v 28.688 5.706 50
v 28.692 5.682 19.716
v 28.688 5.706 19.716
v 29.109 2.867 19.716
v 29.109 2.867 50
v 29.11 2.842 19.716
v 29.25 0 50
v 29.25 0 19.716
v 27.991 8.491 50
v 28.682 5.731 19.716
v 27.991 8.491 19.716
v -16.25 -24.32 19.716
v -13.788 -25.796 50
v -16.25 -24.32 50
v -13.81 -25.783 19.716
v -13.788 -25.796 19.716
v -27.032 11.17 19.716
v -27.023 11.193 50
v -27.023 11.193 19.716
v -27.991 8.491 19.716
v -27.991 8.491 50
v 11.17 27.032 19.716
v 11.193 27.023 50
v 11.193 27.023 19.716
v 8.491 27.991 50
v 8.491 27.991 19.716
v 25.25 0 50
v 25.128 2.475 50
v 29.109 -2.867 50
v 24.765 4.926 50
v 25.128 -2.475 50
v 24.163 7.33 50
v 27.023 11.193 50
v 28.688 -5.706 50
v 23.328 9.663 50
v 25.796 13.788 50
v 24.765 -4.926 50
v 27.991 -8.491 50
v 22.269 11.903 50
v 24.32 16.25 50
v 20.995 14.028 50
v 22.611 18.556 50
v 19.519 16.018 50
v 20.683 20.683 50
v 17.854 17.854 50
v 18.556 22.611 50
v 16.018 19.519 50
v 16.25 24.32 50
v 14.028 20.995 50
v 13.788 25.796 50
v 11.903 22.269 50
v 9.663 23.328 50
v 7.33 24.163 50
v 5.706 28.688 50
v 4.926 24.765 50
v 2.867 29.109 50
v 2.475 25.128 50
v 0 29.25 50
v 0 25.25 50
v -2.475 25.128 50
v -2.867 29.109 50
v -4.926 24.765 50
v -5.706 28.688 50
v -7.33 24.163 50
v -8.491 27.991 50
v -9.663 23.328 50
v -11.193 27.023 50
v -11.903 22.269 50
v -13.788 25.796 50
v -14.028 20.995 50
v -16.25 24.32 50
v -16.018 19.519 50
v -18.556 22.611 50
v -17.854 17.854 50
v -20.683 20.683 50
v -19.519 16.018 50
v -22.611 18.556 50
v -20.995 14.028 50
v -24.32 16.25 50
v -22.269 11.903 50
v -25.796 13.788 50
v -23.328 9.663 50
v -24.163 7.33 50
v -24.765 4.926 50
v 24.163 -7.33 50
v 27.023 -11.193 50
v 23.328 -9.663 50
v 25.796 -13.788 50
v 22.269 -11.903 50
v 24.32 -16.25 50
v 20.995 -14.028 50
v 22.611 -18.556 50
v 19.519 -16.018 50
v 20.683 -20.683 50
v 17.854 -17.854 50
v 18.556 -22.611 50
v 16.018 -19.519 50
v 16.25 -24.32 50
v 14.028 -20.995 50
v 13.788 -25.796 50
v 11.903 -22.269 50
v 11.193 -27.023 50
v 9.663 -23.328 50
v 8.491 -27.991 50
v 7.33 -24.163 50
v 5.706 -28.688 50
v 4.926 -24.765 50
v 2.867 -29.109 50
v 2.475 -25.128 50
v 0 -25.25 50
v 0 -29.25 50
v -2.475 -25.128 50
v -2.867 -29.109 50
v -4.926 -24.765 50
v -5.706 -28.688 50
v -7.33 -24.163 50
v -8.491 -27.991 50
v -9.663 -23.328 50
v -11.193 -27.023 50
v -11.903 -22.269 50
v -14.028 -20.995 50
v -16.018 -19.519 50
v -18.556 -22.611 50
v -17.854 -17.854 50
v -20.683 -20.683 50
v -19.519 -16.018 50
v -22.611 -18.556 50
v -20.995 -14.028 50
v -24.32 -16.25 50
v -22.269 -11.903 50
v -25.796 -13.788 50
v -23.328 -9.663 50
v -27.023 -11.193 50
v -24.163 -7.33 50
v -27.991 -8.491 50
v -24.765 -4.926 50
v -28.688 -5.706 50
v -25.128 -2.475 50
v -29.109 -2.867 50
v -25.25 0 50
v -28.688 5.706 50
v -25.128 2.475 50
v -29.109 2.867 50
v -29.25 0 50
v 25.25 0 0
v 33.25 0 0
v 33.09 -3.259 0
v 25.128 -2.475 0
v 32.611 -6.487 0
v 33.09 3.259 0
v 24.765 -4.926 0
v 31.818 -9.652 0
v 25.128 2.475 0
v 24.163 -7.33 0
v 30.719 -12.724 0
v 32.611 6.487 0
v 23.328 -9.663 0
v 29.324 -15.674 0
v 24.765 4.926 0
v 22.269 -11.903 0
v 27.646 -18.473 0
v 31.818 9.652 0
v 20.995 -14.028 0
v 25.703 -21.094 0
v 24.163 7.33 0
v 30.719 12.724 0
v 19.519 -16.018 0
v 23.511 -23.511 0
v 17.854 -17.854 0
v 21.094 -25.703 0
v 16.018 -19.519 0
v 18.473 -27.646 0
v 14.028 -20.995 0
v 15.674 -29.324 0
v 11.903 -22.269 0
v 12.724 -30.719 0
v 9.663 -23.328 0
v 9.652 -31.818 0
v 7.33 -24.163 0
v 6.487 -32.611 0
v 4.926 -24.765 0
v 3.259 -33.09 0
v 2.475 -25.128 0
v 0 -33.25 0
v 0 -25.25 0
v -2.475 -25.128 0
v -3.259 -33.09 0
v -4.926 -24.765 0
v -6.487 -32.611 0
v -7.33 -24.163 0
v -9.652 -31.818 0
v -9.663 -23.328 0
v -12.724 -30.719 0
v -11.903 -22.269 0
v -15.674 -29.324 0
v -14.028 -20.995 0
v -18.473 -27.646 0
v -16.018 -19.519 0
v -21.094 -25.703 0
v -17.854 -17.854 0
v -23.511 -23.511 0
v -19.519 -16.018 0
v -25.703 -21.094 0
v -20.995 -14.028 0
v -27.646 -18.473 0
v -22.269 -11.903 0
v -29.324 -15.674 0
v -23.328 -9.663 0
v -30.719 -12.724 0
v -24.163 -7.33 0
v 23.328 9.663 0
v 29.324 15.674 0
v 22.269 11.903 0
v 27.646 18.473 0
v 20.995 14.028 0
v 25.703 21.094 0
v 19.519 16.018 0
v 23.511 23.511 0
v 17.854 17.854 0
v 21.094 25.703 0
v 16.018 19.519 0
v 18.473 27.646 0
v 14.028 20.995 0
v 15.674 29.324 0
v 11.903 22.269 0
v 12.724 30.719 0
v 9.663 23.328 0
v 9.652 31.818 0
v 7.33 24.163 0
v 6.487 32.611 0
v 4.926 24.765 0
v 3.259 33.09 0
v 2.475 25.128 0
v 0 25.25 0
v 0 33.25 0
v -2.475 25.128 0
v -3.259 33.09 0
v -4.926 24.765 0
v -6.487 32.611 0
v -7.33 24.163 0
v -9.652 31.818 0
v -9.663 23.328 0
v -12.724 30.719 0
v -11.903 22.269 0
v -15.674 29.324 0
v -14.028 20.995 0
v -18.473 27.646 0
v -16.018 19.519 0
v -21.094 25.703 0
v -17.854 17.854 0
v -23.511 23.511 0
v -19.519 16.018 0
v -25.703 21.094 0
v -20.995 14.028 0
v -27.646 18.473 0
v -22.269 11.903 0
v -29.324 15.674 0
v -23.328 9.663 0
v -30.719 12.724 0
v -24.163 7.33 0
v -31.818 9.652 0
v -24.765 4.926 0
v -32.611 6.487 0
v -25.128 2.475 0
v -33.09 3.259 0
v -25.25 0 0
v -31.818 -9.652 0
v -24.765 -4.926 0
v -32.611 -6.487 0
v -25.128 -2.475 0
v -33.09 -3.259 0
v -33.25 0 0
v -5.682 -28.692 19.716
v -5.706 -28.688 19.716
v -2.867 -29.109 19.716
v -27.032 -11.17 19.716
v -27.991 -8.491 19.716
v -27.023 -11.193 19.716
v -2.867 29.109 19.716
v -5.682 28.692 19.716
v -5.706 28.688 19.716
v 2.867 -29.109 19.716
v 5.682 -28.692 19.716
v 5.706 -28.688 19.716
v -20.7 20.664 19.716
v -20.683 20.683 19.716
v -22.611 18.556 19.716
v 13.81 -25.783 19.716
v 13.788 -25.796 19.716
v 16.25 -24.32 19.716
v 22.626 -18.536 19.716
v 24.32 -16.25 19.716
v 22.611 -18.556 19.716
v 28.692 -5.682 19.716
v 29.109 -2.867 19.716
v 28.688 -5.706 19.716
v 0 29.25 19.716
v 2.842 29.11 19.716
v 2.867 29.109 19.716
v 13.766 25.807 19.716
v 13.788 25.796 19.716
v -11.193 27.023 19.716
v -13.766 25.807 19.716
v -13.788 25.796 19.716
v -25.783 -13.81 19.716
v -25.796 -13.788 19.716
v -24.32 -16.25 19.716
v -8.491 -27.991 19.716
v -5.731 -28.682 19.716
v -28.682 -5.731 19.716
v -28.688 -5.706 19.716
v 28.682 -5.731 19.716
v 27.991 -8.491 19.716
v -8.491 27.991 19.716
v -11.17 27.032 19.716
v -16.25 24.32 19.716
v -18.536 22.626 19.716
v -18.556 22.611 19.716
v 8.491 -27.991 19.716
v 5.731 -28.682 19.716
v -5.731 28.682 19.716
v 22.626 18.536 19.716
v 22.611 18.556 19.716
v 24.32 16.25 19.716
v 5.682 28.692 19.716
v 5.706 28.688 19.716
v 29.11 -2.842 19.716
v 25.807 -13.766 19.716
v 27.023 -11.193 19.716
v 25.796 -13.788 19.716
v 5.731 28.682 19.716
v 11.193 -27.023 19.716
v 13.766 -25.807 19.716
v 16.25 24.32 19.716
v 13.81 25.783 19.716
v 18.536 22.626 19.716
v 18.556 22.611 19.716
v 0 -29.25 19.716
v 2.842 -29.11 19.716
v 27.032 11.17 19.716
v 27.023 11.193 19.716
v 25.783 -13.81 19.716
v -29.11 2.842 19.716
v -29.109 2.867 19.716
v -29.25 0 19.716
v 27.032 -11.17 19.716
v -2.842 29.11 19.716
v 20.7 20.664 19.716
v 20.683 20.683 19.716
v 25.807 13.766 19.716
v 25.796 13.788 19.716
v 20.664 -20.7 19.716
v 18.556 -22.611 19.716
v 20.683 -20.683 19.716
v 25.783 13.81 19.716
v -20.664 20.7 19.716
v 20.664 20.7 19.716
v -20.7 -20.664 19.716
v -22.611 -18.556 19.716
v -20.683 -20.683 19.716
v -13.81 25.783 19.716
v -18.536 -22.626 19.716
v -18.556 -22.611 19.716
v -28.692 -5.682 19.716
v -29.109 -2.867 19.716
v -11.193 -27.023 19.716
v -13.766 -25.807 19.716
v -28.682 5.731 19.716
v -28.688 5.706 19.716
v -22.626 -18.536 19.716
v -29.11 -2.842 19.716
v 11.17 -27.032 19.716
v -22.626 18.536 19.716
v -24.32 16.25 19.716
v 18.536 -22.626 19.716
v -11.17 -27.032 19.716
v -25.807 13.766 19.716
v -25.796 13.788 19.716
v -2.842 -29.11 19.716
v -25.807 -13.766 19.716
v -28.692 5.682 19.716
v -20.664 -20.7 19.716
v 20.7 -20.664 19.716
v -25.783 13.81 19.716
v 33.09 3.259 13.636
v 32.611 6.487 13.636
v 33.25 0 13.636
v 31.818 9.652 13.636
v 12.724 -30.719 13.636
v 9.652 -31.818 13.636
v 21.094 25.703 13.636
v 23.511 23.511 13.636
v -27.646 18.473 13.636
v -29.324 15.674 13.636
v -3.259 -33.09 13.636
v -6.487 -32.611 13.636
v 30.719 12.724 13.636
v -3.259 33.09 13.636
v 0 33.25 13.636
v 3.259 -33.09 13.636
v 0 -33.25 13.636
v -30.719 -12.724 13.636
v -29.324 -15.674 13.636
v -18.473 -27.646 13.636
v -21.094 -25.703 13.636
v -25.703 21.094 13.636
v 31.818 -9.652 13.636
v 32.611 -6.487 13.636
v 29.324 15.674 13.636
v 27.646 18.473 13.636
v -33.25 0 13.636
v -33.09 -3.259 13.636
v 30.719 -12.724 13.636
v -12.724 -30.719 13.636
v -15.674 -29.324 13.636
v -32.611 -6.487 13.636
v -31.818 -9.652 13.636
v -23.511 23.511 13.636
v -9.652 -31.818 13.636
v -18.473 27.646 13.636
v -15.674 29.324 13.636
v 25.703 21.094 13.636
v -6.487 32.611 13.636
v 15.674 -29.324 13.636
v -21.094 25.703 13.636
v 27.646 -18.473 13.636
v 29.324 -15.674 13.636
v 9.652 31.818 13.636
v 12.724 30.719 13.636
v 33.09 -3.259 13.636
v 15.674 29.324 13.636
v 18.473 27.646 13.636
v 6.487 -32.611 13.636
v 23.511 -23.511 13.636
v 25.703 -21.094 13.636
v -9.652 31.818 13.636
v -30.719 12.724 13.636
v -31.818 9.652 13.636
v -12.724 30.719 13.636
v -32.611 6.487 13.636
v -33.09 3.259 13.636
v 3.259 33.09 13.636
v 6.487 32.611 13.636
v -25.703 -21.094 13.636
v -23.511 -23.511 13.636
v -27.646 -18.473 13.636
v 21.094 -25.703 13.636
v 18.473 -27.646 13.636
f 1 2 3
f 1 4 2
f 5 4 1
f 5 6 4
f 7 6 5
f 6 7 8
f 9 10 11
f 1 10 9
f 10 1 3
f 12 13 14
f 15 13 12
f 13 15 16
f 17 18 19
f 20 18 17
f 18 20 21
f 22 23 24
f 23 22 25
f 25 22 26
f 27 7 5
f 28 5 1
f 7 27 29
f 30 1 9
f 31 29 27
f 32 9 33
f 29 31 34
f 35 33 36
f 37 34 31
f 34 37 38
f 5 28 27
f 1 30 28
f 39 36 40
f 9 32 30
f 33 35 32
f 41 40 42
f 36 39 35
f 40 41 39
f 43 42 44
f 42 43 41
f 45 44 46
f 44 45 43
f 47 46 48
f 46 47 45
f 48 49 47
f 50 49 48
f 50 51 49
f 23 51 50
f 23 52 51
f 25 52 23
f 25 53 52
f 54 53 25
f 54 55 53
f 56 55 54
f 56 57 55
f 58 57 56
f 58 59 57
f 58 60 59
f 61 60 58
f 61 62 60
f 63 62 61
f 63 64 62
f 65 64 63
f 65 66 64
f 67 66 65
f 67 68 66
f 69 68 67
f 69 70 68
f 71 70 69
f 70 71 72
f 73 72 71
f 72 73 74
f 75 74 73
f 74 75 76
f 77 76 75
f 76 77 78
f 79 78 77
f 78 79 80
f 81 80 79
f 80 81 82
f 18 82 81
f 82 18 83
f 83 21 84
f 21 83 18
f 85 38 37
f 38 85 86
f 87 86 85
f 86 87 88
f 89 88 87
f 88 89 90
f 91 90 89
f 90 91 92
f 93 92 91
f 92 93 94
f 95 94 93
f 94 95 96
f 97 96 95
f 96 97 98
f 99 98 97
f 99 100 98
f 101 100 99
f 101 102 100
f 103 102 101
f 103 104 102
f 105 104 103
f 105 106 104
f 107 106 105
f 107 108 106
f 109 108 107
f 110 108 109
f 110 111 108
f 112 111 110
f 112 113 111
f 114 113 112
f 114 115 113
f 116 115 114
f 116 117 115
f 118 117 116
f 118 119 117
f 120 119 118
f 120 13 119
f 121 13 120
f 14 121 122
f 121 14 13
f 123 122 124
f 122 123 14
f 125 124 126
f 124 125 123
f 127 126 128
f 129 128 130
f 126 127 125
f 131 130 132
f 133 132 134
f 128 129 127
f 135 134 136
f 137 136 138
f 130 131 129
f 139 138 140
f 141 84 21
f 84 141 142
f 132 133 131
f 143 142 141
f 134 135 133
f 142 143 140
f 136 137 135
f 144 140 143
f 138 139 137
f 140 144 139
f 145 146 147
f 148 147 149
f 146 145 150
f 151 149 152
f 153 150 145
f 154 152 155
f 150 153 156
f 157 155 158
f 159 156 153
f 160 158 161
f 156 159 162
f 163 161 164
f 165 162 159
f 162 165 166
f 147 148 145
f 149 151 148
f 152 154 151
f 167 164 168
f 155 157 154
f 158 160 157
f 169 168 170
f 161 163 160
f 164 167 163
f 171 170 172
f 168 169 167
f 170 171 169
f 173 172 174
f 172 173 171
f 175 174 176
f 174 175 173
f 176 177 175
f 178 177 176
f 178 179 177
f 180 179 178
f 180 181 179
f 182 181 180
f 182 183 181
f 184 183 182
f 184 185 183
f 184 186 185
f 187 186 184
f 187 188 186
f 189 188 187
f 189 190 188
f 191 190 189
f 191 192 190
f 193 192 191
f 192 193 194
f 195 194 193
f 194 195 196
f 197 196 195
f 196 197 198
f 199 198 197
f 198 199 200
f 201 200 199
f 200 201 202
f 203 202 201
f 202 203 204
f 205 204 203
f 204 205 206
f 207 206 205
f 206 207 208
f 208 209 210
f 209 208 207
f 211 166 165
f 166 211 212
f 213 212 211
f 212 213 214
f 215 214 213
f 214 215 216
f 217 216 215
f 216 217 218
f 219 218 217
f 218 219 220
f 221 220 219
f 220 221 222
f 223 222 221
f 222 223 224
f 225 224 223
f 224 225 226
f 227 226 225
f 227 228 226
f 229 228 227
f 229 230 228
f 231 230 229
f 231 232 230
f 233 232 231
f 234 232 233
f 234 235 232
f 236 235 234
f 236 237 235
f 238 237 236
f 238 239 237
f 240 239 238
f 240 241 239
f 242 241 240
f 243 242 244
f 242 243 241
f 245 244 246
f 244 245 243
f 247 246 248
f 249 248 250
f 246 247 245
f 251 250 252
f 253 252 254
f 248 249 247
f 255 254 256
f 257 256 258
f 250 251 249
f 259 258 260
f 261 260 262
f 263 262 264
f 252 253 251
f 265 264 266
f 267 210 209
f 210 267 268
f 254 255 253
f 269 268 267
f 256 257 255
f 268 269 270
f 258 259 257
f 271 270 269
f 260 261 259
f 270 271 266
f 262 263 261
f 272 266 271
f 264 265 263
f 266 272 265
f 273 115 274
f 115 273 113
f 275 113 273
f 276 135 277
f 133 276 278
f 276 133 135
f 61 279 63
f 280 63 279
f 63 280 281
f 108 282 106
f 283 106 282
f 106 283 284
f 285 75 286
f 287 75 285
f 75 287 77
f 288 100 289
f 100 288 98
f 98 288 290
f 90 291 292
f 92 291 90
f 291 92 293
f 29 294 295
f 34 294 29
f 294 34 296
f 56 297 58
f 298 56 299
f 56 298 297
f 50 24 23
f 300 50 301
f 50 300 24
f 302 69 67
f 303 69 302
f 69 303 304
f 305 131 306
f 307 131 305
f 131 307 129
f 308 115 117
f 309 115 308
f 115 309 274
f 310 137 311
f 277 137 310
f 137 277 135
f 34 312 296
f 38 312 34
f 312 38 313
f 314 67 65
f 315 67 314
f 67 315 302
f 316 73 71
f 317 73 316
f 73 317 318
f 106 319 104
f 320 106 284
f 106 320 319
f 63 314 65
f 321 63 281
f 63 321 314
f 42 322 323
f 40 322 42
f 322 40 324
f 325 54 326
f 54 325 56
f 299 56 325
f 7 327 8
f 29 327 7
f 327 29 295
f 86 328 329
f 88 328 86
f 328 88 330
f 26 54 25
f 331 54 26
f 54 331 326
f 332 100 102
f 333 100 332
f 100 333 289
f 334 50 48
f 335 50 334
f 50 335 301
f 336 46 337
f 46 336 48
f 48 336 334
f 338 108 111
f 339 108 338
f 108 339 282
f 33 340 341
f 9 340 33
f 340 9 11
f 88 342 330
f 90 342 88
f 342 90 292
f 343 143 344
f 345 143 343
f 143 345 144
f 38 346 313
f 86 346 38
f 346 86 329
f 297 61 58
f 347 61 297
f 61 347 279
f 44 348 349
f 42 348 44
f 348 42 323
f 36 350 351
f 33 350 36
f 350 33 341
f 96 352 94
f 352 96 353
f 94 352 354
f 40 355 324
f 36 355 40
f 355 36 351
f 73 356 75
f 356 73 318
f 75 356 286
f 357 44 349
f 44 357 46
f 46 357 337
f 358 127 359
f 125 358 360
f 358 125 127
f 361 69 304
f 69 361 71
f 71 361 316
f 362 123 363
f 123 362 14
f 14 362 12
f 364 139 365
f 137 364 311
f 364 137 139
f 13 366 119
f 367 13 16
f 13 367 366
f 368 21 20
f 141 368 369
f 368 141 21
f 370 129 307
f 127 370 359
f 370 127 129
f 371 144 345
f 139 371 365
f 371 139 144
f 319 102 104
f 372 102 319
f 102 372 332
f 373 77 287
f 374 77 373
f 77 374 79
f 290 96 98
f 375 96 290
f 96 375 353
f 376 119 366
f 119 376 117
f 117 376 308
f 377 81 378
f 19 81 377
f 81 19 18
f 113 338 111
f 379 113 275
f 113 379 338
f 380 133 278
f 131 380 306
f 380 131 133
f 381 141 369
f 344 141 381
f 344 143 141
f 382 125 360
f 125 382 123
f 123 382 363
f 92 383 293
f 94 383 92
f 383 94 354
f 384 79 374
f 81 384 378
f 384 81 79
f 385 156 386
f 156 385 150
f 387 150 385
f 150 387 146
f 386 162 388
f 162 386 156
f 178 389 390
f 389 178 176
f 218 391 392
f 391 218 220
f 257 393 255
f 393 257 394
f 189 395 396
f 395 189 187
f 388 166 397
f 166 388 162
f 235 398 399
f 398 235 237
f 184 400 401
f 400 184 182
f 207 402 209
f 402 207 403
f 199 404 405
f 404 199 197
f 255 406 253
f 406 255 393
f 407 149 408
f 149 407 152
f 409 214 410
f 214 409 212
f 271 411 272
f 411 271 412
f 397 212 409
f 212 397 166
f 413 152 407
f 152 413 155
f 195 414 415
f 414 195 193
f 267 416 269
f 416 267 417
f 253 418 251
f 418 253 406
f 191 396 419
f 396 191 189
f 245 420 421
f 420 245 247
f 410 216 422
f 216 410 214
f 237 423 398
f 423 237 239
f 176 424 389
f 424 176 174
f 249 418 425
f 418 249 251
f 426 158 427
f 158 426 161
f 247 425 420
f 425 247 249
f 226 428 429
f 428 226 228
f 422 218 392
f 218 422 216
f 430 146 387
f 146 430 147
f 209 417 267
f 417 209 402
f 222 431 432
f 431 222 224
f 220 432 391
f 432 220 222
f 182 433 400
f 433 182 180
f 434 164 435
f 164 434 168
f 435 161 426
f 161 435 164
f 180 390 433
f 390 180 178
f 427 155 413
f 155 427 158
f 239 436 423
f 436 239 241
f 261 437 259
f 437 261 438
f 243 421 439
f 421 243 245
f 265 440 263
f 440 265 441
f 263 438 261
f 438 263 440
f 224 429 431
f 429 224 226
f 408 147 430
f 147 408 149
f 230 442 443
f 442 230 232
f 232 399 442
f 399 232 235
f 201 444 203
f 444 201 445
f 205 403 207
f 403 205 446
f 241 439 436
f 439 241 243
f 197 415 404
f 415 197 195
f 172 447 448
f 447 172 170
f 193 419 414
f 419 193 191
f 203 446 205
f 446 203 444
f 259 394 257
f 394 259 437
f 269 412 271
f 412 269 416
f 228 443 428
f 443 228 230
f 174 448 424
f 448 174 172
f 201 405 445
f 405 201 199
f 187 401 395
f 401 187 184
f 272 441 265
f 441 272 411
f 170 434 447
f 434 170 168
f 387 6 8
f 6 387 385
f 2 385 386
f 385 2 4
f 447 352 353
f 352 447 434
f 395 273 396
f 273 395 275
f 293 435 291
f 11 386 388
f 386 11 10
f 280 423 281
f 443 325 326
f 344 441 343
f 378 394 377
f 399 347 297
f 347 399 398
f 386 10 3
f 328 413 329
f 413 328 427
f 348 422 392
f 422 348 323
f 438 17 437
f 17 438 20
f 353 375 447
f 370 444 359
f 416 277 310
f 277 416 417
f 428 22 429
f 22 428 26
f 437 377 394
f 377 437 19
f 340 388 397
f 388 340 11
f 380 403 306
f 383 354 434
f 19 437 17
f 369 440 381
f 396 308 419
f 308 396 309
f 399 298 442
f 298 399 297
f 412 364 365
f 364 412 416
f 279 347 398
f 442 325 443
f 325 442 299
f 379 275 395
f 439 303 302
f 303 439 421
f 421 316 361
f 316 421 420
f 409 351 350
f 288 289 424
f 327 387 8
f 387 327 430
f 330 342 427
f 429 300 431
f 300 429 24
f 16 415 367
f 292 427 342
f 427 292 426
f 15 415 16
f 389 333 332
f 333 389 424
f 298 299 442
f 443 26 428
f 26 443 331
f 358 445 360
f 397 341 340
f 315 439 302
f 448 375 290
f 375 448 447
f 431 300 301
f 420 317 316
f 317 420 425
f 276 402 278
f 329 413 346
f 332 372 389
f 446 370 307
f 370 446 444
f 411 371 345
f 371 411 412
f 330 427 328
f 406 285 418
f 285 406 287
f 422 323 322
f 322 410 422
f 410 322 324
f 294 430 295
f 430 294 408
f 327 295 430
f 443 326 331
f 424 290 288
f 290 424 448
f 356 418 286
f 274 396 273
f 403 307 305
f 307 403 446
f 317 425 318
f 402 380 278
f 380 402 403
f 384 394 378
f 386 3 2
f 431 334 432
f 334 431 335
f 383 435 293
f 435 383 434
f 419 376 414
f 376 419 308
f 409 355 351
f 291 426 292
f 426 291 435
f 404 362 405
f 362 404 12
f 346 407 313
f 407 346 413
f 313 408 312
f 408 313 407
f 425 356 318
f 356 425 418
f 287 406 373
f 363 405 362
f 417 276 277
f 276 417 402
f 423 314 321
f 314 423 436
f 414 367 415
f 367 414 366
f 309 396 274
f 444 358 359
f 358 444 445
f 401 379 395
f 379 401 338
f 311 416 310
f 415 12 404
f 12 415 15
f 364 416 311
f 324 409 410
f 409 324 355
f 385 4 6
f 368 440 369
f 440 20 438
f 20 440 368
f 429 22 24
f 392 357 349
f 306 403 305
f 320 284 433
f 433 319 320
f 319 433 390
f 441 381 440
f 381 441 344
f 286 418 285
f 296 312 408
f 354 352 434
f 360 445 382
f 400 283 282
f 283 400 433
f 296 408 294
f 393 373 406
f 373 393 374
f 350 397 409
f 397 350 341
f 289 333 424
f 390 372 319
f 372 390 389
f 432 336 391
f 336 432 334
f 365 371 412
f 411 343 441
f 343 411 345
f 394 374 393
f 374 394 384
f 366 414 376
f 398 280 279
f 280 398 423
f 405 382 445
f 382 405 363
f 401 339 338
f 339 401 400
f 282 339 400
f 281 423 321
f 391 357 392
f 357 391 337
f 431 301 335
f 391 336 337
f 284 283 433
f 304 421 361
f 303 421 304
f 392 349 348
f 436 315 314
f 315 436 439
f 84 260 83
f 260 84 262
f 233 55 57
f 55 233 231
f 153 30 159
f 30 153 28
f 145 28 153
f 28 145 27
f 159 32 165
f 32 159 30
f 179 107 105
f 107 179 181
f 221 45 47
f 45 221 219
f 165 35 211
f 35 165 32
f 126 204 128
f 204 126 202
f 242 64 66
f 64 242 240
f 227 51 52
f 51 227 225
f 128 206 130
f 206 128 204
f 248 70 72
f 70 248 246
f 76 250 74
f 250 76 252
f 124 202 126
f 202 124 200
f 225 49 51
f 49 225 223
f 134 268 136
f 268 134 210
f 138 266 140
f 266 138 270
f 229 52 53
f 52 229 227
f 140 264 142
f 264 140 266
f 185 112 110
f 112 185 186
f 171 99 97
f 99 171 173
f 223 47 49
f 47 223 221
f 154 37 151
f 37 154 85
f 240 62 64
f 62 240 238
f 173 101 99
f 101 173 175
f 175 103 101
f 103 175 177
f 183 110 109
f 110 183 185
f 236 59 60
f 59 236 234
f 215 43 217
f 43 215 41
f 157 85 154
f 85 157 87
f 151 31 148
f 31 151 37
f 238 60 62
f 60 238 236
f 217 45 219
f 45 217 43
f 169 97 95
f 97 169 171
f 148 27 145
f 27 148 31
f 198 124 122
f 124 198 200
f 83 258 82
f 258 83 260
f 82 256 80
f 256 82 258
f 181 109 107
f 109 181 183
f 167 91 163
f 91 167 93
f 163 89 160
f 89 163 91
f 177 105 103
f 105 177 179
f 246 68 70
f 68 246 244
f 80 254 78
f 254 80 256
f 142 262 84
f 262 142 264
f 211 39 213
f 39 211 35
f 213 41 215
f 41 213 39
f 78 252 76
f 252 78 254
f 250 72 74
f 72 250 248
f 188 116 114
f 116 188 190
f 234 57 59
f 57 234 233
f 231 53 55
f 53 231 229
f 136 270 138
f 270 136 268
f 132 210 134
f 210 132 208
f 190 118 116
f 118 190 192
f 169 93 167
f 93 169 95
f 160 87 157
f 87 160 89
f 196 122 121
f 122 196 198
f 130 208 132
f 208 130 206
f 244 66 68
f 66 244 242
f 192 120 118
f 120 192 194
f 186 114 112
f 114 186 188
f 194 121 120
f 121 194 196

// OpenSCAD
/* [Pipe Dimensions] */
// Outside Diameter
pipe_od = 50;
// Total Height
total_ht = 50;
// Fudge
fudge = .25;
// Wall Thickness
wall_thick = 2;
// Cylinders Resolution
cyl_res = 64;


difference() {

	union() {
		cylinder(r=(pipe_od/2)+(wall_thick*2)+fudge,h=total_ht,$fn=cyl_res);
		cylinder(r=(pipe_od/2)+((wall_thick*2)+(wall_thick*2)+fudge),h=total_ht/3.66666,$fn=cyl_res);
		//cone
		translate([0,0,total_ht/3.66666]) cylinder(r1=(pipe_od/2)+((wall_thick*2)+(wall_thick*2)+fudge),r2=2,h=total_ht*.95,$fn=cyl_res);
	}

	union() {
		cylinder(r=(pipe_od/2)+fudge,h=total_ht*2,$fn=cyl_res);
	}

}
